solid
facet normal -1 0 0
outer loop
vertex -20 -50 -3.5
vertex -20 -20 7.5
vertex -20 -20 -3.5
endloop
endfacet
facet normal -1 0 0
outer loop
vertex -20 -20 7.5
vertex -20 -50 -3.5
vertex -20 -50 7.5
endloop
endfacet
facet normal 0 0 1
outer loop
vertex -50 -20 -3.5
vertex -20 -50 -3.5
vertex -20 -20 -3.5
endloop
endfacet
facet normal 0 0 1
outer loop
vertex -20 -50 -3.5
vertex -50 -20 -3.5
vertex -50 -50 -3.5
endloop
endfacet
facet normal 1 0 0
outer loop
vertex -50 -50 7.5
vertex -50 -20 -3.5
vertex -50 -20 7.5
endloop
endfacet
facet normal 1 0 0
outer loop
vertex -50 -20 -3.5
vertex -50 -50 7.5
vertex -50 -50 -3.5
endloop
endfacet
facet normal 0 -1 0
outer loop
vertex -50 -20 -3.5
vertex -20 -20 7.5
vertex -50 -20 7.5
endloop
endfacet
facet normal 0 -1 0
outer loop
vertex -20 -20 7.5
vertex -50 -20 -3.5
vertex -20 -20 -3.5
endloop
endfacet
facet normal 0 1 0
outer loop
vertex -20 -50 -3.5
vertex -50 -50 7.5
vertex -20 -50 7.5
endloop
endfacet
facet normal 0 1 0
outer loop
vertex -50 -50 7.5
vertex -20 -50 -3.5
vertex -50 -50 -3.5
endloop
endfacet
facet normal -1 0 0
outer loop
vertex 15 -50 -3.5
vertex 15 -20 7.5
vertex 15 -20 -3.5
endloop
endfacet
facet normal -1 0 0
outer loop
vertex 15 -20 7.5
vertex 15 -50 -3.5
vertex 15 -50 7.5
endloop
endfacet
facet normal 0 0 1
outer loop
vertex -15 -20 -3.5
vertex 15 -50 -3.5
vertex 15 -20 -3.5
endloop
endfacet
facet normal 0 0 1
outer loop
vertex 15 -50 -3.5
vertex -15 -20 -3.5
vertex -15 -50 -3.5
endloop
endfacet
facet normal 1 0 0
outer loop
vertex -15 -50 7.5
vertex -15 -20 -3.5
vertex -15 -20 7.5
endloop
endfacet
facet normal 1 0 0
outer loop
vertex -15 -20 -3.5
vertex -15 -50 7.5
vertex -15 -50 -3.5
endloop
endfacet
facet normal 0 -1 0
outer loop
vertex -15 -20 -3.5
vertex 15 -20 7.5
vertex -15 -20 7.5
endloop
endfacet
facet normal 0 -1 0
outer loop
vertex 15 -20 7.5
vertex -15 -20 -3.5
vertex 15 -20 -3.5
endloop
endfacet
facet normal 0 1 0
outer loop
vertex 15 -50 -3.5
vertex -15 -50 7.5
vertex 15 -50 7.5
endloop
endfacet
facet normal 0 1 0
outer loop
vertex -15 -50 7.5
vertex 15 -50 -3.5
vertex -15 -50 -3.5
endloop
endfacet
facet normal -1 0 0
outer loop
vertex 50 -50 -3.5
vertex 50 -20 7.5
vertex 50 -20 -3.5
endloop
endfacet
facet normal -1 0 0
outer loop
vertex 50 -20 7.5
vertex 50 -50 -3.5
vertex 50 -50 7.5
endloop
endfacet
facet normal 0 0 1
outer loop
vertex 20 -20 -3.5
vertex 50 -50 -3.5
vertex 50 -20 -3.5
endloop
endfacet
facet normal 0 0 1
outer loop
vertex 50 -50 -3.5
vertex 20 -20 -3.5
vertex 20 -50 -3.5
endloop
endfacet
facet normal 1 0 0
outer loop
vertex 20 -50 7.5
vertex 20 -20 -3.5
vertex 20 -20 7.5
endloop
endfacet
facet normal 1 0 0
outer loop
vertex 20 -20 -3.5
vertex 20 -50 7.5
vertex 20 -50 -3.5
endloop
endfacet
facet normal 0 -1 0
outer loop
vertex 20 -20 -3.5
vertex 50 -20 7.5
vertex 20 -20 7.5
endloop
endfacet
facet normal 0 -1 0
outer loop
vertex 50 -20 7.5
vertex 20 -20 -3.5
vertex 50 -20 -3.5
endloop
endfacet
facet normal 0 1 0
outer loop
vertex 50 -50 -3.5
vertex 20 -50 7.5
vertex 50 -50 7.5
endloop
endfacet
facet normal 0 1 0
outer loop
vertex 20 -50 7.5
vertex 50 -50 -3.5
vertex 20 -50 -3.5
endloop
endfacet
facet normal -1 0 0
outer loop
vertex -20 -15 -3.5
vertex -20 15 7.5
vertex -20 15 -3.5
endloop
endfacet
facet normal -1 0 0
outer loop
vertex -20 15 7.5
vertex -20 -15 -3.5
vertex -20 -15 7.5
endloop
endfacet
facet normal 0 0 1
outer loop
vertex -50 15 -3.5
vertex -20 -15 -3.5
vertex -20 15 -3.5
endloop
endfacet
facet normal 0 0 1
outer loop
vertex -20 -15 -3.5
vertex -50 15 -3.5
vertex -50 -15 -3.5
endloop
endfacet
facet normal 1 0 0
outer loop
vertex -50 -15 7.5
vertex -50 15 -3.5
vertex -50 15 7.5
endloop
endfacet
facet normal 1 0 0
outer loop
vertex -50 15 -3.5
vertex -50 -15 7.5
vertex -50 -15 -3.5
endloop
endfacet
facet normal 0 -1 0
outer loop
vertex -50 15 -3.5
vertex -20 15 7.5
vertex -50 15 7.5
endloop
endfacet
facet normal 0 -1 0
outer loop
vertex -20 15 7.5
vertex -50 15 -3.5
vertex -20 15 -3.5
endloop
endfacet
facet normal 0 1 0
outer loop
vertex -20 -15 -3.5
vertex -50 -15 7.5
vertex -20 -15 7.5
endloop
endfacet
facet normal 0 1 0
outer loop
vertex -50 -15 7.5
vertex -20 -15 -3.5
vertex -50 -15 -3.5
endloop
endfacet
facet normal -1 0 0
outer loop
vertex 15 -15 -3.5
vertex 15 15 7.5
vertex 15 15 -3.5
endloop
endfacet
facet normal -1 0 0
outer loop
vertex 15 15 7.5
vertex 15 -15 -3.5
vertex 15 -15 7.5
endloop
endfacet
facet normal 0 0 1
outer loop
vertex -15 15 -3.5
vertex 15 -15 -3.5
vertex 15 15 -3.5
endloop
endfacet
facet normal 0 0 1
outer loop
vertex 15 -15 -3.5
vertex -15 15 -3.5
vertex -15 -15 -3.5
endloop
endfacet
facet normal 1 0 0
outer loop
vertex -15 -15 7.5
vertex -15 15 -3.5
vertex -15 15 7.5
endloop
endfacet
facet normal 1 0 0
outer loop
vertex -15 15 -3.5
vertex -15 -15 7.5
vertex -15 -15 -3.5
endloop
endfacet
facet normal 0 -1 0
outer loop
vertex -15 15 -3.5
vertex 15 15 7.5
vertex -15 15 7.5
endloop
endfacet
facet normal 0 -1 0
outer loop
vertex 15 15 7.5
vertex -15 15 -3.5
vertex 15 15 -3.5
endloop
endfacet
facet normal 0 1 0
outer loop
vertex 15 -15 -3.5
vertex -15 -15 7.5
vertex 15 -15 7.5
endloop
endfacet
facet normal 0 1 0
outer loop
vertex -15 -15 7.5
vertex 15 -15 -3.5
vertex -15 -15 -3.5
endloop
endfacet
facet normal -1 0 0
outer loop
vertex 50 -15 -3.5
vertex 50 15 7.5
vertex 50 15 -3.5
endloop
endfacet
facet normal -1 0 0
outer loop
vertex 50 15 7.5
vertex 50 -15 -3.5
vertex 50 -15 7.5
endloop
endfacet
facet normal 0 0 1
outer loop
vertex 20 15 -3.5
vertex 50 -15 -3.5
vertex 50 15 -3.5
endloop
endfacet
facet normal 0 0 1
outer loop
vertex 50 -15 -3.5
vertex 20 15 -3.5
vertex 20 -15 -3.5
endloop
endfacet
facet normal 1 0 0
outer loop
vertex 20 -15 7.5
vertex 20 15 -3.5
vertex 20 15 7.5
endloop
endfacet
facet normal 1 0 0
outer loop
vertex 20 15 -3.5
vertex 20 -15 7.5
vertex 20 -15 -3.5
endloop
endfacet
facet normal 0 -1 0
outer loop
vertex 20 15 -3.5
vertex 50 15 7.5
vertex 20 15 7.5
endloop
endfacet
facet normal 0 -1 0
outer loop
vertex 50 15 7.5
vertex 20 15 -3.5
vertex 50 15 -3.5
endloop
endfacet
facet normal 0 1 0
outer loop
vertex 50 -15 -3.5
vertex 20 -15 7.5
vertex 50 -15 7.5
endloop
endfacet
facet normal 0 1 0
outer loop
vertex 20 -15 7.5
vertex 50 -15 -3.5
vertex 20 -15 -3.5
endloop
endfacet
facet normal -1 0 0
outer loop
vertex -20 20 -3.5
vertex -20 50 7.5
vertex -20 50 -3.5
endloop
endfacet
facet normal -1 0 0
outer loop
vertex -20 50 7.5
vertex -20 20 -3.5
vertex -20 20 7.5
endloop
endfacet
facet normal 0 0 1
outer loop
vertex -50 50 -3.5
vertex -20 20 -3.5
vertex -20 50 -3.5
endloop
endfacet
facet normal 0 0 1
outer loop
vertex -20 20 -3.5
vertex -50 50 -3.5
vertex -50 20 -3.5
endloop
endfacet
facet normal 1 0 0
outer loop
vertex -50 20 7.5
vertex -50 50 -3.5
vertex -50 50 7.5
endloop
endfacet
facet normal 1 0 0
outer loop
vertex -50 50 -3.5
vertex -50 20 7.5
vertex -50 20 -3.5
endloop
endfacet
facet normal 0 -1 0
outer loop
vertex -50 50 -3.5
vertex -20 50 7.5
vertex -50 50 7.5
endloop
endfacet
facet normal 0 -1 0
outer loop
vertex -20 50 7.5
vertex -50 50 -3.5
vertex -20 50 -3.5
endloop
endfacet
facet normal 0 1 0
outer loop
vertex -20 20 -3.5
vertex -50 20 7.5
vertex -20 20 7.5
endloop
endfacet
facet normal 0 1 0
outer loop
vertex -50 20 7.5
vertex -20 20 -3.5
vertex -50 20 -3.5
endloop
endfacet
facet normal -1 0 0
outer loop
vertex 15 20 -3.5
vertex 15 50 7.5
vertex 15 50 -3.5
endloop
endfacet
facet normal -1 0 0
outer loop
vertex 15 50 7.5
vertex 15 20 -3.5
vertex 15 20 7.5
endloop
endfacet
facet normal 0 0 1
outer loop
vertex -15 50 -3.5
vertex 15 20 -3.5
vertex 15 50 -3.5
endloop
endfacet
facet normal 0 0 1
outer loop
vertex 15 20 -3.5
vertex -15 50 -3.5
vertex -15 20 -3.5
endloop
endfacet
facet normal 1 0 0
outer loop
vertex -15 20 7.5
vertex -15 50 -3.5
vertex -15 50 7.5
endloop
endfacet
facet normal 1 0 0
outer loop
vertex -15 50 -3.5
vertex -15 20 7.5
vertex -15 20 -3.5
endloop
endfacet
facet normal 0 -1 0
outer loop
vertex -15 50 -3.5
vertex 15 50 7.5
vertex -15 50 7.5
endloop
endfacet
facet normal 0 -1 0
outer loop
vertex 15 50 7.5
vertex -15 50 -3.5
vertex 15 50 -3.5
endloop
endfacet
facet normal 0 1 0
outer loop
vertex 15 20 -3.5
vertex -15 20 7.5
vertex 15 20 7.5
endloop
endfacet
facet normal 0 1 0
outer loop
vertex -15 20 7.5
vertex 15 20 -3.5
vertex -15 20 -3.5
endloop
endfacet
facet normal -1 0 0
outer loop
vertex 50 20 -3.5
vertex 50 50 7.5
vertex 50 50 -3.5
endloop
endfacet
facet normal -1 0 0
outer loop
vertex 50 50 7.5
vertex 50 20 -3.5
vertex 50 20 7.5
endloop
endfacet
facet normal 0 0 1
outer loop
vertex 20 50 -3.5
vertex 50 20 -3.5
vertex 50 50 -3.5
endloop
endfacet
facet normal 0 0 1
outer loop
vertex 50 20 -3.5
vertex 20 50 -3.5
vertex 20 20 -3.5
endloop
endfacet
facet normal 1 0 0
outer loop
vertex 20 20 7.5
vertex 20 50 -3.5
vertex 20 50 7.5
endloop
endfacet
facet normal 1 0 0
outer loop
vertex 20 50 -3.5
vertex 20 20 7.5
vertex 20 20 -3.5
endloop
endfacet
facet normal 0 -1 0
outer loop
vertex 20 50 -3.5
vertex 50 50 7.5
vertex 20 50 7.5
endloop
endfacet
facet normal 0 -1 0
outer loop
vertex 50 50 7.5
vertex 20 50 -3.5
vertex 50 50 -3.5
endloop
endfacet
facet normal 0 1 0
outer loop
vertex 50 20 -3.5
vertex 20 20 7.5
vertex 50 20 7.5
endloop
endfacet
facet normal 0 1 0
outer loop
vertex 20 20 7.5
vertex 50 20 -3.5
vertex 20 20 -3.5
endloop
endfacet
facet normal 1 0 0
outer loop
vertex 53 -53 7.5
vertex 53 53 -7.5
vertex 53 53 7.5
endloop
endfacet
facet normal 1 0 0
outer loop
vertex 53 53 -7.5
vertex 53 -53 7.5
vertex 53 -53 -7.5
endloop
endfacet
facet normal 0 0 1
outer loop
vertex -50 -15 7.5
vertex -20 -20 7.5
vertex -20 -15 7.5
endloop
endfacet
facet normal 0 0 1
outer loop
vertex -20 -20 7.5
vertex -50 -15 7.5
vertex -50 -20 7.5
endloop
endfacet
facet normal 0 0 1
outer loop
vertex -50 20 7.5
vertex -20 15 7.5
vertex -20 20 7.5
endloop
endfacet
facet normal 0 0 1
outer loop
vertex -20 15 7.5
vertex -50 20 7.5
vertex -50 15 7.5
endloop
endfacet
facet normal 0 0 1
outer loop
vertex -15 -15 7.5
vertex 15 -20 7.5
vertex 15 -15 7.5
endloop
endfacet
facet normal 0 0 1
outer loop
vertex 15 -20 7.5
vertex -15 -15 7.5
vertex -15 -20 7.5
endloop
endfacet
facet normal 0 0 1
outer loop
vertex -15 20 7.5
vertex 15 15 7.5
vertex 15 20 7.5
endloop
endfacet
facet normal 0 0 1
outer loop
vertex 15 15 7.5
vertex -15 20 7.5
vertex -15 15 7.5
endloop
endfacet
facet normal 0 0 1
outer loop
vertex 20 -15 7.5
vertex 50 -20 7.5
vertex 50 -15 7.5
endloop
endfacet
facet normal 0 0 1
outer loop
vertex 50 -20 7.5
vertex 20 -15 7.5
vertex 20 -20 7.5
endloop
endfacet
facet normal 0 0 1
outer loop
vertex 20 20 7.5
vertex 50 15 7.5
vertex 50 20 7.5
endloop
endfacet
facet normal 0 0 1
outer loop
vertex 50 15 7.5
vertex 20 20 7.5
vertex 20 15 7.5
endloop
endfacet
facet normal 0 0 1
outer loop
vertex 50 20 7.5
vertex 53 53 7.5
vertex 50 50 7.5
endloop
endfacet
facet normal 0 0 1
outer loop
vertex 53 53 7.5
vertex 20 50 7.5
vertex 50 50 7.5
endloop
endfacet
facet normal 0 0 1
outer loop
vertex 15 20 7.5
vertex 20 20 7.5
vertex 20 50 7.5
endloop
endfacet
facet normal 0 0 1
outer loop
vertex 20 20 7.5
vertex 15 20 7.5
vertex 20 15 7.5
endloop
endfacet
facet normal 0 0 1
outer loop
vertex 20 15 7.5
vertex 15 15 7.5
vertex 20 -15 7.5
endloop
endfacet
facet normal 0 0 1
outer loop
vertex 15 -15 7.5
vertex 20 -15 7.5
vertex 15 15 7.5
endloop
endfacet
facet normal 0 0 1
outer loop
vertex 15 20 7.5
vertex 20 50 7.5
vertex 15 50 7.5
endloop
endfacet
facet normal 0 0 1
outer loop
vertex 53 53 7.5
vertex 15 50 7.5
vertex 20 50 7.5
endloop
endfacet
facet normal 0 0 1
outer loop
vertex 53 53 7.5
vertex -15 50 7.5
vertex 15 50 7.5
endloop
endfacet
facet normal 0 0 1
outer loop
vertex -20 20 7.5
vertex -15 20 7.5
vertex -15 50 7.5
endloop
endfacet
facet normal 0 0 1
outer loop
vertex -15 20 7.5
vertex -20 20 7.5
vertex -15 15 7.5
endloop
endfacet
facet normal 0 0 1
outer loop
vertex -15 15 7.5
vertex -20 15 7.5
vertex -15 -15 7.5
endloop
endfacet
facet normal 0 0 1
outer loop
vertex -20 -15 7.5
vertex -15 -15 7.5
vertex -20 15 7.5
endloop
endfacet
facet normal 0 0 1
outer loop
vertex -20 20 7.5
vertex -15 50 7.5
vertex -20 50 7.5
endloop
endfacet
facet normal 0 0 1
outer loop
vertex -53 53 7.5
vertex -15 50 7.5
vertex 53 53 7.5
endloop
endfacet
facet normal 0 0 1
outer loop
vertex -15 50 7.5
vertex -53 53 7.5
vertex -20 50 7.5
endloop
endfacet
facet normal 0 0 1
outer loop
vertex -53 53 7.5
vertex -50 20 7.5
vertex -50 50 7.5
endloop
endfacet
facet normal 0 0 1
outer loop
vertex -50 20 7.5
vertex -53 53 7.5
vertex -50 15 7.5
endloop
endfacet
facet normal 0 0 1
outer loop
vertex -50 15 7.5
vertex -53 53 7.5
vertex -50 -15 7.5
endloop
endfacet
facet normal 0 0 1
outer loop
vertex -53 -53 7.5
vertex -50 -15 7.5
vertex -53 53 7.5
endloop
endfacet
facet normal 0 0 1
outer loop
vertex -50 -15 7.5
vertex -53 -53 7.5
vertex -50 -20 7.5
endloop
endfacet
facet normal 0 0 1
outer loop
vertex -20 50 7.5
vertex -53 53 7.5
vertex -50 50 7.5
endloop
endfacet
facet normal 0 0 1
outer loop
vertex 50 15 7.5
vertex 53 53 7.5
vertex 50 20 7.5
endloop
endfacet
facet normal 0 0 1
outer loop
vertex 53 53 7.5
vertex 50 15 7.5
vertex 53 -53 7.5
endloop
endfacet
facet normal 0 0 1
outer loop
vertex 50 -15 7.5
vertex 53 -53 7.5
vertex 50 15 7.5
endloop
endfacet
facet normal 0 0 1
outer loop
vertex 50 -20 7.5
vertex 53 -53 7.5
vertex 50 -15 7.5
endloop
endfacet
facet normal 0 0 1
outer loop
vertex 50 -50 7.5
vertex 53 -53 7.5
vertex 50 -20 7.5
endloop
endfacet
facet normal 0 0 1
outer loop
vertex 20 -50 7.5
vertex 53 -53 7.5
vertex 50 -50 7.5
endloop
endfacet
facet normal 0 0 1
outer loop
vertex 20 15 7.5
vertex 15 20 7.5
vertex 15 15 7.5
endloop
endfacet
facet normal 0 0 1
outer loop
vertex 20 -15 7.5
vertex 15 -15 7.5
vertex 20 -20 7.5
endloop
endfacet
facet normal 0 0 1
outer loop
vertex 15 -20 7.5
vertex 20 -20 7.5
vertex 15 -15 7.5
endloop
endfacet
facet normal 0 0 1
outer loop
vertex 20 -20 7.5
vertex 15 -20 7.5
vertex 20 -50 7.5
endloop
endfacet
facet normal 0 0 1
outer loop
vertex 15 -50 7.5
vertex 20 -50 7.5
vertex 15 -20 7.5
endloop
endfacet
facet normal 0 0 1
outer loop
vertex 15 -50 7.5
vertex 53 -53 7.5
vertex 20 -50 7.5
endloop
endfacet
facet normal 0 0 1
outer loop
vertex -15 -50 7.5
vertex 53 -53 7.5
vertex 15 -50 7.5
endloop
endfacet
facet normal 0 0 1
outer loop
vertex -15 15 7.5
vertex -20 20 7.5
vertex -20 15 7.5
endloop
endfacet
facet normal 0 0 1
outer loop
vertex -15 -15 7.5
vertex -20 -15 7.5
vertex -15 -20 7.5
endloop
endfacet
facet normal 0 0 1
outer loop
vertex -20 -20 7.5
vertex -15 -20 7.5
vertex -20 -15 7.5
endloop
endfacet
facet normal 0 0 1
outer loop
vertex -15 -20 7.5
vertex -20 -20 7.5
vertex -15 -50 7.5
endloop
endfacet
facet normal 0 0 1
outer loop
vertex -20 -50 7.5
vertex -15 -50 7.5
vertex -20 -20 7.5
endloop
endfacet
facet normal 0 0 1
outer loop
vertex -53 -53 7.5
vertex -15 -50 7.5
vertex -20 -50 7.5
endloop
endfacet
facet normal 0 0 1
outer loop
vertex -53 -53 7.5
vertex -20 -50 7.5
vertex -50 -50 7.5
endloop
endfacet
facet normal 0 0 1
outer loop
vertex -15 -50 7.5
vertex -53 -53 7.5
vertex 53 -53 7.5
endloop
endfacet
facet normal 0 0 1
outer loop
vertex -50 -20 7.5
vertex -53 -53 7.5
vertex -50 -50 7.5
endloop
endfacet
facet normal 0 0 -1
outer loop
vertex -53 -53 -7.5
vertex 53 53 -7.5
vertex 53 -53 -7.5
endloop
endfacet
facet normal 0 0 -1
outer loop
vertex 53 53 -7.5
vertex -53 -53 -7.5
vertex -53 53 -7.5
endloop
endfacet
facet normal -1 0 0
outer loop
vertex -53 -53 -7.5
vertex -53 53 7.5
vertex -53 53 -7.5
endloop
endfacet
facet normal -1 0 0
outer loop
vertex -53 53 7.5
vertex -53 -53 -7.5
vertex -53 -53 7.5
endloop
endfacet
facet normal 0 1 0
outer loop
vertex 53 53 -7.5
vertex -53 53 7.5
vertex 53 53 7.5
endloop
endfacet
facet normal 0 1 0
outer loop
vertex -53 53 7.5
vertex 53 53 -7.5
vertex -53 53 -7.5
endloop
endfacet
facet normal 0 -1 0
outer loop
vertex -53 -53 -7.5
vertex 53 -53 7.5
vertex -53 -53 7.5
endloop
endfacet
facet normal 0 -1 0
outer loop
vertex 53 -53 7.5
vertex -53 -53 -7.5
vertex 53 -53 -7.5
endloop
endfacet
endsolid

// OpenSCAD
$fn = 32;

// ----------------------------------------------------------------------
// Pocket plate 106 x 106 x 15
// 3 x 3 pockets 30 mm square, 11 mm deep
// ----------------------------------------------------------------------

// --- parameters (mm) ---
thickness = 15;  // plate thickness
floor_t = 4;     // material left under each pocket
pocket = 30;     // pocket side length
pitch_x = 35;    // pocket pitch along X
pitch_y = 35;    // pocket pitch along Y
cols = 3;        // pockets per row
rows = 3;        // rows of pockets

// --- derived feature positions (mm) ---
depth = thickness - floor_t;        // = 11   pocket depth, down to the floor
span_x = (cols - 1) * pitch_x;      // = 70   distance between outer pockets
span_y = (rows - 1) * pitch_y;      // = 70   distance between outer pocket rows
origin_x = -span_x / 2;             // = -35   X of the first pocket
origin_y = -span_y / 2;             // = -35   Y of the first pocket
plate = [span_x + pocket + 6, span_y + pocket + 6, thickness];  // = [106, 106, 15]   overall size: pockets plus 3 mm of wall on each side
feature_centers = [
  [origin_x + 0 * pitch_x, origin_y + 0 * pitch_y],
  [origin_x + 1 * pitch_x, origin_y + 0 * pitch_y],
  [origin_x + 2 * pitch_x, origin_y + 0 * pitch_y],
  [origin_x + 0 * pitch_x, origin_y + 1 * pitch_y],
  [origin_x + 1 * pitch_x, origin_y + 1 * pitch_y],
  [origin_x + 2 * pitch_x, origin_y + 1 * pitch_y],
  [origin_x + 0 * pitch_x, origin_y + 2 * pitch_y],
  [origin_x + 1 * pitch_x, origin_y + 2 * pitch_y],
  [origin_x + 2 * pitch_x, origin_y + 2 * pitch_y]
];   // pocket centres, used verbatim by the cutter loop

// plate outline, then one pocket per centre in feature_centers
difference() {
  cube(plate, center = true);
  for (centre = feature_centers)
    translate([centre[0] - pocket / 2, centre[1] - pocket / 2, plate[2] / 2 - depth])
      cube([pocket, pocket, depth + 1]);  // centred on the declared pocket centre
}
